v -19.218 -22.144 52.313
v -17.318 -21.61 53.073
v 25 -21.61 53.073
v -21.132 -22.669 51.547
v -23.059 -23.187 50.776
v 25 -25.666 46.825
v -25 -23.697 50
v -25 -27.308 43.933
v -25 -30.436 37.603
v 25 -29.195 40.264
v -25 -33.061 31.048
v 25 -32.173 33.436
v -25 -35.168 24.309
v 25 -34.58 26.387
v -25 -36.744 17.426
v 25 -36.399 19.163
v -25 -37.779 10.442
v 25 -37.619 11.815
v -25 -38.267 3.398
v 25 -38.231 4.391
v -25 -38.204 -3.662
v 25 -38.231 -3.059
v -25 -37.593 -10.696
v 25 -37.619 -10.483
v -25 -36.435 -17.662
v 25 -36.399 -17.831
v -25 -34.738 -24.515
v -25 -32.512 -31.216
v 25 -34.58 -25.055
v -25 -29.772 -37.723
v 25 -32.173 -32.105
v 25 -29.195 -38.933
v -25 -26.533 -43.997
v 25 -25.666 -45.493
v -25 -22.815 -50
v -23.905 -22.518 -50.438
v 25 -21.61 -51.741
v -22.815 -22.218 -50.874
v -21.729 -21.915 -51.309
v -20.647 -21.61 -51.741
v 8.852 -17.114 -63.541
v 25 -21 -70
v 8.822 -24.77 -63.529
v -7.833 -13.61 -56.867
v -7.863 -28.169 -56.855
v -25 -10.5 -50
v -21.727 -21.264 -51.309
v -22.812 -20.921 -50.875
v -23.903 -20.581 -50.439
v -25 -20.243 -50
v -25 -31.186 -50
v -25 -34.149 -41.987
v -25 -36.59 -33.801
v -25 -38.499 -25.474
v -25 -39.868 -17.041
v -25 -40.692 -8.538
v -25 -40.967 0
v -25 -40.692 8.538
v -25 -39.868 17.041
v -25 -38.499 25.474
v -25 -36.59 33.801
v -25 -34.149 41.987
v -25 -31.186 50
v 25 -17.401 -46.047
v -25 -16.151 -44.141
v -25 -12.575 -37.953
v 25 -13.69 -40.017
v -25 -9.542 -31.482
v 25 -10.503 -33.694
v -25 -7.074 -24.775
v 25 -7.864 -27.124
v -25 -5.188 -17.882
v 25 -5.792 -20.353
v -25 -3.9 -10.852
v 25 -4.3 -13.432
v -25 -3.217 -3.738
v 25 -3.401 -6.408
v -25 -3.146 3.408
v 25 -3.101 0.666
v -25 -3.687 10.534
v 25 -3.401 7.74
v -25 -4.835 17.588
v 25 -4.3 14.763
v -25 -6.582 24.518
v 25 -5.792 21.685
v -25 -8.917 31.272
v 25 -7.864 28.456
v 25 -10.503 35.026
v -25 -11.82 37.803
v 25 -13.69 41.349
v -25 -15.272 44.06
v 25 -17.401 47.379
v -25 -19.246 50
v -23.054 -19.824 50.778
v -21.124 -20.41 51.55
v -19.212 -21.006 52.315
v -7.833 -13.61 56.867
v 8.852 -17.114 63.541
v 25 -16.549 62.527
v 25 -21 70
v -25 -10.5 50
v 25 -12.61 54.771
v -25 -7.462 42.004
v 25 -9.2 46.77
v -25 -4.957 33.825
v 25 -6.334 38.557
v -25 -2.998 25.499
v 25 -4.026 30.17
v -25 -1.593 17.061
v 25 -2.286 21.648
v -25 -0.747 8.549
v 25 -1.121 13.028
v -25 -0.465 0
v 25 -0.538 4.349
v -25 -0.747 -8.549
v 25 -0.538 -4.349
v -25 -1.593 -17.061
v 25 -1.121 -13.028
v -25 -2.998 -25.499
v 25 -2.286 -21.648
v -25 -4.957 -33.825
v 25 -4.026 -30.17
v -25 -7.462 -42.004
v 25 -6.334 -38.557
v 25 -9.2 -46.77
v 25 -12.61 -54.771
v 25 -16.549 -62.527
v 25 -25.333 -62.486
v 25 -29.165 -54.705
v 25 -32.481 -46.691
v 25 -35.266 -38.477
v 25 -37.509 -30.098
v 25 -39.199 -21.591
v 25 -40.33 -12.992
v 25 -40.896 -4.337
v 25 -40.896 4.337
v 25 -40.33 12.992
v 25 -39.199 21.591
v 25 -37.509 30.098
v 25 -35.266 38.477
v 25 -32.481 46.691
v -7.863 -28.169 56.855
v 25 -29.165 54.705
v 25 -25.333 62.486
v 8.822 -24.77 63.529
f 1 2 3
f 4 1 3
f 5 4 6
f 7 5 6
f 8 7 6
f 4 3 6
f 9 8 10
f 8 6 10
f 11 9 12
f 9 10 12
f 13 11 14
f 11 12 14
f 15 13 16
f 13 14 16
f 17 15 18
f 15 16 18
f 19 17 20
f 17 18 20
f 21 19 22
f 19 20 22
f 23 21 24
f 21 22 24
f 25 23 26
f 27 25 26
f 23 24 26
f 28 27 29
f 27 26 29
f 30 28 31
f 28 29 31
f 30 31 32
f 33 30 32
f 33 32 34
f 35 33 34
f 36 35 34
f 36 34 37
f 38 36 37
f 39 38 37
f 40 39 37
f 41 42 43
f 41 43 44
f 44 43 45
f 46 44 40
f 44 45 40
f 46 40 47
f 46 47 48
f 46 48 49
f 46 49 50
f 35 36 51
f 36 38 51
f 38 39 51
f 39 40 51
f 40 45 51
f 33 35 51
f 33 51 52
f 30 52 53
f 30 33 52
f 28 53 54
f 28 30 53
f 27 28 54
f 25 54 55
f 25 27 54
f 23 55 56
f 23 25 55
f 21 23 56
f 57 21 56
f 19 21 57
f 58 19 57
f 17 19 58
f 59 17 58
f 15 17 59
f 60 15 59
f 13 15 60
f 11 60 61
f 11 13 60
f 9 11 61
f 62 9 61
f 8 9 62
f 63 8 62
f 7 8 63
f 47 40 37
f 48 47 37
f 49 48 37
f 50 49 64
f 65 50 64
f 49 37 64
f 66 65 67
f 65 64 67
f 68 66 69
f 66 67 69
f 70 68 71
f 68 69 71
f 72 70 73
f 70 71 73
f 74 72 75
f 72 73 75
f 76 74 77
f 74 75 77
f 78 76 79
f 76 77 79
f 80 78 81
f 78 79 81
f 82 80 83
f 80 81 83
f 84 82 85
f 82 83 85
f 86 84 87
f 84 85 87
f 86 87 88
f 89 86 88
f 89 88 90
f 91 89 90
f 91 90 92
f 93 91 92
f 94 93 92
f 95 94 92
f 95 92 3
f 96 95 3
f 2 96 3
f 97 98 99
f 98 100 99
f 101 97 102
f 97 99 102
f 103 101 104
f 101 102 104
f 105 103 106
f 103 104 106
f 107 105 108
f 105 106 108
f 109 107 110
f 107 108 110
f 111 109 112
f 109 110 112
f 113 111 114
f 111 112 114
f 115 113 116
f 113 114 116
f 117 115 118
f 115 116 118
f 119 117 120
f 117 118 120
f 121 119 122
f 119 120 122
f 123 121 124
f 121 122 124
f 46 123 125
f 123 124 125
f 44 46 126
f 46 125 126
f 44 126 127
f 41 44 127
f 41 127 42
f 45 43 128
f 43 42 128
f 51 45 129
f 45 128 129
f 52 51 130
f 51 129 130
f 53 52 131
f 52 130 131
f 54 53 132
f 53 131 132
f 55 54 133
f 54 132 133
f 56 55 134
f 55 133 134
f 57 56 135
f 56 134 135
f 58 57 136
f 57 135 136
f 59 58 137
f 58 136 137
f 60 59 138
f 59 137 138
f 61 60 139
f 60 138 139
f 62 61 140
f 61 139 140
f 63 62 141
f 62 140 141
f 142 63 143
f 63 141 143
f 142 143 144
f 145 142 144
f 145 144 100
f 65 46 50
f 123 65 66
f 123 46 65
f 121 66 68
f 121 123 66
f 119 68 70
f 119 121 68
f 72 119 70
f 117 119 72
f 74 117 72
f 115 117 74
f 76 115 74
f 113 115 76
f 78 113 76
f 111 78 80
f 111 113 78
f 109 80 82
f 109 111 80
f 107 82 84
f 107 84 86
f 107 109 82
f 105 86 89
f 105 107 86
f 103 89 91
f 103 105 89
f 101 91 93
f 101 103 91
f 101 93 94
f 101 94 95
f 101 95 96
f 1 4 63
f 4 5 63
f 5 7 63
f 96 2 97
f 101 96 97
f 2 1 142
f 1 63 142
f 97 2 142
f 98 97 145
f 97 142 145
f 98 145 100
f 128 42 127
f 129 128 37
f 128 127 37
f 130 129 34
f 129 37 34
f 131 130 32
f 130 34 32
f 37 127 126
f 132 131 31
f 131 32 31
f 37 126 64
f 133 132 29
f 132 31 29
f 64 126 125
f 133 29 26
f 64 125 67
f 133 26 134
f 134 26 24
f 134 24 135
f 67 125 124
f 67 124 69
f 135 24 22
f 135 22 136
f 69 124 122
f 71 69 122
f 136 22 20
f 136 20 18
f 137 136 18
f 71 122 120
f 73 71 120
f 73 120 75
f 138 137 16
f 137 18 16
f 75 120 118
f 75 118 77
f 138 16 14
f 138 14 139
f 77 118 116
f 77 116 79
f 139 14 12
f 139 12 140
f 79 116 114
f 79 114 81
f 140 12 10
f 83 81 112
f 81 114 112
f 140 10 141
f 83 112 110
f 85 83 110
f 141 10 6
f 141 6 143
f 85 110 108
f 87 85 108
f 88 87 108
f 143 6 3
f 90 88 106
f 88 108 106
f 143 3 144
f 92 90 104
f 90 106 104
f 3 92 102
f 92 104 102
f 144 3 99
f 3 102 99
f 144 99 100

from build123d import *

# Parameters (mm, degrees)
F0_W     = 50
F0_H     = 140
F1_DEPTH = 42
F3_DEPTH = 42
F5_DEPTH = 50
F7_DEPTH = 50
F9_DEPTH = 50


with BuildPart() as f1:
    # F0 (on Front) → F1 (new body)
    with BuildSketch(Plane.XZ):
        Rectangle(F0_W, F0_H)
    extrude(amount=F1_DEPTH)

    # F2 (on face) → F3 (cut)
    with BuildSketch(Plane.XZ.offset(42)):
        Polygon((25, 70), (-25, 70), (-25, 50), align=None)
        Polygon((-25, -50), (-25, -70), (25, -70), align=None)
    extrude(amount=-F3_DEPTH, mode=Mode.SUBTRACT)

    # F4 (on face) → F5 (cut)
    with BuildSketch(Plane.YZ.offset(25)):
        with BuildLine():
            ThreePointArc((-21, -70), (-40.967372, 0), (-21, 70))
            Line((-21, 70), (-47.731567, 70))
            Line((-47.731567, 70), (-47.731567, -70))
            Line((-47.731567, -70), (-21, -70))
        make_face()
    extrude(amount=-F5_DEPTH, mode=Mode.SUBTRACT)

    # F6 (on face) → F7 (cut)
    with BuildSketch(Plane.YZ.offset(25)):
        with BuildLine():
            ThreePointArc((-21, 70), (-0.464572, 0), (-21, -70))
            Line((-21, -70), (3.54092, -70))
            Line((3.54092, -70), (3.54092, 70))
            Line((3.54092, 70), (-21, 70))
        make_face()
    extrude(amount=-F7_DEPTH, mode=Mode.SUBTRACT)

    # F8 (on face) → F9 (cut)
    with BuildSketch(Plane.YZ.offset(25)):
        with BuildLine():
            ThreePointArc((-21.610456, 53.072974), (-38.307918, 0.665912), (-21.610456, -51.741149))
            ThreePointArc((-21.610456, -51.741149), (-3.101031, 0.665912), (-21.610456, 53.072974))
        make_face()
    extrude(amount=-F9_DEPTH, mode=Mode.SUBTRACT)


solid = f1.part
